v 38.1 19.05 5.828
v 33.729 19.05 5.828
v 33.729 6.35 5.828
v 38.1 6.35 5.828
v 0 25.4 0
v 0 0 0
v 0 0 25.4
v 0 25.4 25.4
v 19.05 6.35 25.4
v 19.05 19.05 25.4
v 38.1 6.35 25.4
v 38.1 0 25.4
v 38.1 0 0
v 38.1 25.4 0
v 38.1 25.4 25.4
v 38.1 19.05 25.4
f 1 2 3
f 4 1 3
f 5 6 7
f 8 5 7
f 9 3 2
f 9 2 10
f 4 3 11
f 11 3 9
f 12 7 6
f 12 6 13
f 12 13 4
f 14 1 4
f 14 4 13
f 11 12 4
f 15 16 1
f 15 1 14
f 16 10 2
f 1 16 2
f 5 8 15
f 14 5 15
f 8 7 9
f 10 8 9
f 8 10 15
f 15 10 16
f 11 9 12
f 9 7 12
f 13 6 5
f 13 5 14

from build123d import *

# Parameters (mm, degrees)
F0_W     = 19.05
F0_H     = 25.4
F1_DEPTH = 25.4
F3_DEPTH = 38.1
F4_DEPTH = 25.4


with BuildPart() as f1:
    # F0 (on Front) → F1 (new body)
    with BuildSketch(Plane.XZ):
        with Locations((9.525, 12.7)):
            Rectangle(F0_W, F0_H)
    extrude(amount=-F1_DEPTH)

    # F2 (on Right) → F3 (join)
    with BuildSketch(Plane.YZ):
        Polygon((0, 25.4), (0, 0), (25.4, 0), (25.4, 25.4), (19.05, 25.4), (19.05, 5.828295), (6.35, 5.828295), (6.35, 25.4), align=None)
    extrude(amount=F3_DEPTH)

    # F0 (on Front) → F4 (join)
    with BuildSketch(Plane.XZ):
        Polygon((19.05, 25.4), (19.05, 0), (38.1, 0), align=None)
    extrude(amount=-F4_DEPTH)


solid = f1.part
